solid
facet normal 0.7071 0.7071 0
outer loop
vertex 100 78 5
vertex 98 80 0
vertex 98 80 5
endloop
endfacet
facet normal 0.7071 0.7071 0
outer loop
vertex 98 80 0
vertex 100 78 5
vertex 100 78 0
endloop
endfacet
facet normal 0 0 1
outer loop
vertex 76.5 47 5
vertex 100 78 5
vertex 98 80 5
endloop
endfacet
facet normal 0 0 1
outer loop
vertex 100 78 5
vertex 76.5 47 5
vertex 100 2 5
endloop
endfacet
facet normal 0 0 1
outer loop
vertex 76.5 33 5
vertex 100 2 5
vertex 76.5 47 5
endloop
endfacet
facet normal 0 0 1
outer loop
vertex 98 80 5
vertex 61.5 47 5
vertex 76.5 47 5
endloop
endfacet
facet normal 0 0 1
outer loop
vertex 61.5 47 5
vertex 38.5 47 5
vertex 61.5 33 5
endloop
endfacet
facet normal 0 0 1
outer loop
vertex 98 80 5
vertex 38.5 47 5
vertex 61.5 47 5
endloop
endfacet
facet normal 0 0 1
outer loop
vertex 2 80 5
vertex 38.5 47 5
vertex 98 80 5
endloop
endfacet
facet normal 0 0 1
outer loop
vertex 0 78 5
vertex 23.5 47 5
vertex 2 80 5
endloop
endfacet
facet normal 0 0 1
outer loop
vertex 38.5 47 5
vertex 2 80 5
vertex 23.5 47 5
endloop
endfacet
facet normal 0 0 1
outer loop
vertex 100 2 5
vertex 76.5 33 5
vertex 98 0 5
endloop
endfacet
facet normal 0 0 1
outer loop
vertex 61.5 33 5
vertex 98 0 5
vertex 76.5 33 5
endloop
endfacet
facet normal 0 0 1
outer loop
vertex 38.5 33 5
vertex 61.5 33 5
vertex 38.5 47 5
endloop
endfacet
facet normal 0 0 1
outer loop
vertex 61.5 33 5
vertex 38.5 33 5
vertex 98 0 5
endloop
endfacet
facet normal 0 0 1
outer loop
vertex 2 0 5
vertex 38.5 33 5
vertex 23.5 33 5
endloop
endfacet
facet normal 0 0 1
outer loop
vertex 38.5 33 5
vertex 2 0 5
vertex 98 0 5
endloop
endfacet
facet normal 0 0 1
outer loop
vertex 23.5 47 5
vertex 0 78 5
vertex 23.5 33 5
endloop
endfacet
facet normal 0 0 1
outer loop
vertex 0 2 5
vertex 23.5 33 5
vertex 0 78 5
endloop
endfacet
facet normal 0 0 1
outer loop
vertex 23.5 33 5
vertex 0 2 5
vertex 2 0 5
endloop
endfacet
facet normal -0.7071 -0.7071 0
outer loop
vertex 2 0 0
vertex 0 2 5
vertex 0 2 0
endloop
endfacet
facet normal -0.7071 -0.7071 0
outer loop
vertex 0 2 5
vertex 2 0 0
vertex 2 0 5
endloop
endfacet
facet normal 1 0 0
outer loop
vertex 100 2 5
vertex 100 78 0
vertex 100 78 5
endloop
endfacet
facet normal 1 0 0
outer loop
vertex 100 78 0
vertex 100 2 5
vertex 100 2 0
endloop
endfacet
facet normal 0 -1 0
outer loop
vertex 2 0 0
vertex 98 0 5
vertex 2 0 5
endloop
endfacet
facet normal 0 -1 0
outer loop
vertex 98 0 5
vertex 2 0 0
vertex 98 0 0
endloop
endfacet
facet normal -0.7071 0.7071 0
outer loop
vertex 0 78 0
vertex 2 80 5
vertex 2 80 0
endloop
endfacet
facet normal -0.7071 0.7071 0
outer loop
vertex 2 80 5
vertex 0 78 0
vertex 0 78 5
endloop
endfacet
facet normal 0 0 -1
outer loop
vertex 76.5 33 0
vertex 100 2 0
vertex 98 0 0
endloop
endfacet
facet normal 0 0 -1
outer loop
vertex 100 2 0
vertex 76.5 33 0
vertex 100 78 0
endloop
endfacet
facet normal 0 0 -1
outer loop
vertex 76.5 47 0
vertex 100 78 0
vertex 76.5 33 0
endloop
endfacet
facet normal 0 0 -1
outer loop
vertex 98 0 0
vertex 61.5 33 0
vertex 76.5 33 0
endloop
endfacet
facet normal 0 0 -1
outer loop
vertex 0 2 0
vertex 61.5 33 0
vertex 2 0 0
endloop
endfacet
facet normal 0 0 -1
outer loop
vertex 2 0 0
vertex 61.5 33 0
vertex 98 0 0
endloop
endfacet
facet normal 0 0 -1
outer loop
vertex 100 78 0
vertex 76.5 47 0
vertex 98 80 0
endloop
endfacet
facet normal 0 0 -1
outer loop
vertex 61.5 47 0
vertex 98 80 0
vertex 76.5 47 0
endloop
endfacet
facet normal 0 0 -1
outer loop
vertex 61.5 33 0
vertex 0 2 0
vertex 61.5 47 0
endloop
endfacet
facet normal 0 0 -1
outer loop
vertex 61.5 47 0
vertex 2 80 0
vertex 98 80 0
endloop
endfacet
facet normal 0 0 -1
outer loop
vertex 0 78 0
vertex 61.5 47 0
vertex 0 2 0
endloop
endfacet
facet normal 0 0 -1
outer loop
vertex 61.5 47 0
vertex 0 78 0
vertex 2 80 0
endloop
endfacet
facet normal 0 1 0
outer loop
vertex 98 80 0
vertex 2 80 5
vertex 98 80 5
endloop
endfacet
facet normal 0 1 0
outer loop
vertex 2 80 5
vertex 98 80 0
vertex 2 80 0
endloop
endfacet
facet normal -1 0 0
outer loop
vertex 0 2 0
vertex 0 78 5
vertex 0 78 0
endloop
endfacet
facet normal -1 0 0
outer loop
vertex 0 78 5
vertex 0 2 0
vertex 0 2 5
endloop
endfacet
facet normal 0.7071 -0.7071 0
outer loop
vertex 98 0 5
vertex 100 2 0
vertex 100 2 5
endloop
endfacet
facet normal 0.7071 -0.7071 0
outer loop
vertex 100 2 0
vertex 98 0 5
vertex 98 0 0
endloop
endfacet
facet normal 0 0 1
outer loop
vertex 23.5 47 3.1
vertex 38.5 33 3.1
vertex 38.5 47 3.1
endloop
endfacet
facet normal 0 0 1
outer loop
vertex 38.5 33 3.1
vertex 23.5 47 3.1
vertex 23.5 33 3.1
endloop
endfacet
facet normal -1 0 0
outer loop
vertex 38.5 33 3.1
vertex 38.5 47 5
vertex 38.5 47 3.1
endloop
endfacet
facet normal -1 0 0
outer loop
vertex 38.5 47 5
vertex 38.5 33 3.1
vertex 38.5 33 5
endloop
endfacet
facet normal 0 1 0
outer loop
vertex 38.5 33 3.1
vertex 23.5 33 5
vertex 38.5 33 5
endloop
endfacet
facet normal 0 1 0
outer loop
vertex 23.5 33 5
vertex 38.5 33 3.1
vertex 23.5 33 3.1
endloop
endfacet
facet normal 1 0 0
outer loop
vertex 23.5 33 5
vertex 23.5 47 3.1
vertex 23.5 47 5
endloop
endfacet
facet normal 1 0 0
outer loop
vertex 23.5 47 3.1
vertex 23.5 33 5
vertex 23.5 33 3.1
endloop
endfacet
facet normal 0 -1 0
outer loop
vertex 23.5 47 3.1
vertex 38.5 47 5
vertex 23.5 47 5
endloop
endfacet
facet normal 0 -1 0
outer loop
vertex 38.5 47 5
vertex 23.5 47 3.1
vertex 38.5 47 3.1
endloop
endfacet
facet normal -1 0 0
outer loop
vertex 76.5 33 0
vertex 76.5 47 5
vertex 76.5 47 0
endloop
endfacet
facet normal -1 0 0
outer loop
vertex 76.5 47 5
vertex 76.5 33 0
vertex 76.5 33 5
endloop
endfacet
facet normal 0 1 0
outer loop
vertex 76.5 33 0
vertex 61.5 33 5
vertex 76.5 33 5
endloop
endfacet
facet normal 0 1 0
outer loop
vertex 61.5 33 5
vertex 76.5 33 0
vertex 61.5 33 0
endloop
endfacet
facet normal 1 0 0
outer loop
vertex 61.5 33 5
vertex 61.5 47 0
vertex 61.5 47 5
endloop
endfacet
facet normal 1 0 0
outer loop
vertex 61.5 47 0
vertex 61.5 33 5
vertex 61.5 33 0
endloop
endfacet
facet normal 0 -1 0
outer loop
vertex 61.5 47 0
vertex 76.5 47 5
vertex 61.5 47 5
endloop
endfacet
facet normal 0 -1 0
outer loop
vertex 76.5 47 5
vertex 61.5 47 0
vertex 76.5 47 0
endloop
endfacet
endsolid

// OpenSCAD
$fn = 32;

// ----------------------------------------------------------------------
// Windowed plate: 2 voids, 100 x 80 x 5 mm
// ----------------------------------------------------------------------

// --- parameters (mm) ---
plate_l = 100;            // plate length, X
plate_w = 80;             // plate width, Y
plate_t = 5;              // plate thickness, Z
edge_margin = 12;         // wall from the plate edge to any window
windows = 2;              // number of windows in the row
win_l = 15;               // window length
win_w = 14;               // window width
win_pitch = 38;           // window pitch along X
depth_1 = 1.9;            // depth of void 1 (full thickness = through)
depth_2 = 5;              // depth of void 2 (full thickness = through)
corner_c = 2;             // corner chamfer of the plate

profile = [[2, 0], [98, 0], [100, 2], [100, 78], [98, 80], [2, 80], [0, 78], [0, 2]];  // primary outline, 8 points, counter clockwise
void_1 = [[23.5, 33], [38.5, 33], [38.5, 47], [23.5, 47]];  // window 1 of the row, 4 points
void_2 = [[61.5, 33], [76.5, 33], [76.5, 47], [61.5, 47]];  // window 2 of the row, 4 points

// --- the one profile operation ---
difference() {
  linear_extrude(height = plate_t) polygon(points = profile);
  translate([0, 0, plate_t - depth_1])
    linear_extrude(height = depth_1 + 1) polygon(points = void_1);
  translate([0, 0, -1])
    linear_extrude(height = plate_t + 2) polygon(points = void_2);
}
